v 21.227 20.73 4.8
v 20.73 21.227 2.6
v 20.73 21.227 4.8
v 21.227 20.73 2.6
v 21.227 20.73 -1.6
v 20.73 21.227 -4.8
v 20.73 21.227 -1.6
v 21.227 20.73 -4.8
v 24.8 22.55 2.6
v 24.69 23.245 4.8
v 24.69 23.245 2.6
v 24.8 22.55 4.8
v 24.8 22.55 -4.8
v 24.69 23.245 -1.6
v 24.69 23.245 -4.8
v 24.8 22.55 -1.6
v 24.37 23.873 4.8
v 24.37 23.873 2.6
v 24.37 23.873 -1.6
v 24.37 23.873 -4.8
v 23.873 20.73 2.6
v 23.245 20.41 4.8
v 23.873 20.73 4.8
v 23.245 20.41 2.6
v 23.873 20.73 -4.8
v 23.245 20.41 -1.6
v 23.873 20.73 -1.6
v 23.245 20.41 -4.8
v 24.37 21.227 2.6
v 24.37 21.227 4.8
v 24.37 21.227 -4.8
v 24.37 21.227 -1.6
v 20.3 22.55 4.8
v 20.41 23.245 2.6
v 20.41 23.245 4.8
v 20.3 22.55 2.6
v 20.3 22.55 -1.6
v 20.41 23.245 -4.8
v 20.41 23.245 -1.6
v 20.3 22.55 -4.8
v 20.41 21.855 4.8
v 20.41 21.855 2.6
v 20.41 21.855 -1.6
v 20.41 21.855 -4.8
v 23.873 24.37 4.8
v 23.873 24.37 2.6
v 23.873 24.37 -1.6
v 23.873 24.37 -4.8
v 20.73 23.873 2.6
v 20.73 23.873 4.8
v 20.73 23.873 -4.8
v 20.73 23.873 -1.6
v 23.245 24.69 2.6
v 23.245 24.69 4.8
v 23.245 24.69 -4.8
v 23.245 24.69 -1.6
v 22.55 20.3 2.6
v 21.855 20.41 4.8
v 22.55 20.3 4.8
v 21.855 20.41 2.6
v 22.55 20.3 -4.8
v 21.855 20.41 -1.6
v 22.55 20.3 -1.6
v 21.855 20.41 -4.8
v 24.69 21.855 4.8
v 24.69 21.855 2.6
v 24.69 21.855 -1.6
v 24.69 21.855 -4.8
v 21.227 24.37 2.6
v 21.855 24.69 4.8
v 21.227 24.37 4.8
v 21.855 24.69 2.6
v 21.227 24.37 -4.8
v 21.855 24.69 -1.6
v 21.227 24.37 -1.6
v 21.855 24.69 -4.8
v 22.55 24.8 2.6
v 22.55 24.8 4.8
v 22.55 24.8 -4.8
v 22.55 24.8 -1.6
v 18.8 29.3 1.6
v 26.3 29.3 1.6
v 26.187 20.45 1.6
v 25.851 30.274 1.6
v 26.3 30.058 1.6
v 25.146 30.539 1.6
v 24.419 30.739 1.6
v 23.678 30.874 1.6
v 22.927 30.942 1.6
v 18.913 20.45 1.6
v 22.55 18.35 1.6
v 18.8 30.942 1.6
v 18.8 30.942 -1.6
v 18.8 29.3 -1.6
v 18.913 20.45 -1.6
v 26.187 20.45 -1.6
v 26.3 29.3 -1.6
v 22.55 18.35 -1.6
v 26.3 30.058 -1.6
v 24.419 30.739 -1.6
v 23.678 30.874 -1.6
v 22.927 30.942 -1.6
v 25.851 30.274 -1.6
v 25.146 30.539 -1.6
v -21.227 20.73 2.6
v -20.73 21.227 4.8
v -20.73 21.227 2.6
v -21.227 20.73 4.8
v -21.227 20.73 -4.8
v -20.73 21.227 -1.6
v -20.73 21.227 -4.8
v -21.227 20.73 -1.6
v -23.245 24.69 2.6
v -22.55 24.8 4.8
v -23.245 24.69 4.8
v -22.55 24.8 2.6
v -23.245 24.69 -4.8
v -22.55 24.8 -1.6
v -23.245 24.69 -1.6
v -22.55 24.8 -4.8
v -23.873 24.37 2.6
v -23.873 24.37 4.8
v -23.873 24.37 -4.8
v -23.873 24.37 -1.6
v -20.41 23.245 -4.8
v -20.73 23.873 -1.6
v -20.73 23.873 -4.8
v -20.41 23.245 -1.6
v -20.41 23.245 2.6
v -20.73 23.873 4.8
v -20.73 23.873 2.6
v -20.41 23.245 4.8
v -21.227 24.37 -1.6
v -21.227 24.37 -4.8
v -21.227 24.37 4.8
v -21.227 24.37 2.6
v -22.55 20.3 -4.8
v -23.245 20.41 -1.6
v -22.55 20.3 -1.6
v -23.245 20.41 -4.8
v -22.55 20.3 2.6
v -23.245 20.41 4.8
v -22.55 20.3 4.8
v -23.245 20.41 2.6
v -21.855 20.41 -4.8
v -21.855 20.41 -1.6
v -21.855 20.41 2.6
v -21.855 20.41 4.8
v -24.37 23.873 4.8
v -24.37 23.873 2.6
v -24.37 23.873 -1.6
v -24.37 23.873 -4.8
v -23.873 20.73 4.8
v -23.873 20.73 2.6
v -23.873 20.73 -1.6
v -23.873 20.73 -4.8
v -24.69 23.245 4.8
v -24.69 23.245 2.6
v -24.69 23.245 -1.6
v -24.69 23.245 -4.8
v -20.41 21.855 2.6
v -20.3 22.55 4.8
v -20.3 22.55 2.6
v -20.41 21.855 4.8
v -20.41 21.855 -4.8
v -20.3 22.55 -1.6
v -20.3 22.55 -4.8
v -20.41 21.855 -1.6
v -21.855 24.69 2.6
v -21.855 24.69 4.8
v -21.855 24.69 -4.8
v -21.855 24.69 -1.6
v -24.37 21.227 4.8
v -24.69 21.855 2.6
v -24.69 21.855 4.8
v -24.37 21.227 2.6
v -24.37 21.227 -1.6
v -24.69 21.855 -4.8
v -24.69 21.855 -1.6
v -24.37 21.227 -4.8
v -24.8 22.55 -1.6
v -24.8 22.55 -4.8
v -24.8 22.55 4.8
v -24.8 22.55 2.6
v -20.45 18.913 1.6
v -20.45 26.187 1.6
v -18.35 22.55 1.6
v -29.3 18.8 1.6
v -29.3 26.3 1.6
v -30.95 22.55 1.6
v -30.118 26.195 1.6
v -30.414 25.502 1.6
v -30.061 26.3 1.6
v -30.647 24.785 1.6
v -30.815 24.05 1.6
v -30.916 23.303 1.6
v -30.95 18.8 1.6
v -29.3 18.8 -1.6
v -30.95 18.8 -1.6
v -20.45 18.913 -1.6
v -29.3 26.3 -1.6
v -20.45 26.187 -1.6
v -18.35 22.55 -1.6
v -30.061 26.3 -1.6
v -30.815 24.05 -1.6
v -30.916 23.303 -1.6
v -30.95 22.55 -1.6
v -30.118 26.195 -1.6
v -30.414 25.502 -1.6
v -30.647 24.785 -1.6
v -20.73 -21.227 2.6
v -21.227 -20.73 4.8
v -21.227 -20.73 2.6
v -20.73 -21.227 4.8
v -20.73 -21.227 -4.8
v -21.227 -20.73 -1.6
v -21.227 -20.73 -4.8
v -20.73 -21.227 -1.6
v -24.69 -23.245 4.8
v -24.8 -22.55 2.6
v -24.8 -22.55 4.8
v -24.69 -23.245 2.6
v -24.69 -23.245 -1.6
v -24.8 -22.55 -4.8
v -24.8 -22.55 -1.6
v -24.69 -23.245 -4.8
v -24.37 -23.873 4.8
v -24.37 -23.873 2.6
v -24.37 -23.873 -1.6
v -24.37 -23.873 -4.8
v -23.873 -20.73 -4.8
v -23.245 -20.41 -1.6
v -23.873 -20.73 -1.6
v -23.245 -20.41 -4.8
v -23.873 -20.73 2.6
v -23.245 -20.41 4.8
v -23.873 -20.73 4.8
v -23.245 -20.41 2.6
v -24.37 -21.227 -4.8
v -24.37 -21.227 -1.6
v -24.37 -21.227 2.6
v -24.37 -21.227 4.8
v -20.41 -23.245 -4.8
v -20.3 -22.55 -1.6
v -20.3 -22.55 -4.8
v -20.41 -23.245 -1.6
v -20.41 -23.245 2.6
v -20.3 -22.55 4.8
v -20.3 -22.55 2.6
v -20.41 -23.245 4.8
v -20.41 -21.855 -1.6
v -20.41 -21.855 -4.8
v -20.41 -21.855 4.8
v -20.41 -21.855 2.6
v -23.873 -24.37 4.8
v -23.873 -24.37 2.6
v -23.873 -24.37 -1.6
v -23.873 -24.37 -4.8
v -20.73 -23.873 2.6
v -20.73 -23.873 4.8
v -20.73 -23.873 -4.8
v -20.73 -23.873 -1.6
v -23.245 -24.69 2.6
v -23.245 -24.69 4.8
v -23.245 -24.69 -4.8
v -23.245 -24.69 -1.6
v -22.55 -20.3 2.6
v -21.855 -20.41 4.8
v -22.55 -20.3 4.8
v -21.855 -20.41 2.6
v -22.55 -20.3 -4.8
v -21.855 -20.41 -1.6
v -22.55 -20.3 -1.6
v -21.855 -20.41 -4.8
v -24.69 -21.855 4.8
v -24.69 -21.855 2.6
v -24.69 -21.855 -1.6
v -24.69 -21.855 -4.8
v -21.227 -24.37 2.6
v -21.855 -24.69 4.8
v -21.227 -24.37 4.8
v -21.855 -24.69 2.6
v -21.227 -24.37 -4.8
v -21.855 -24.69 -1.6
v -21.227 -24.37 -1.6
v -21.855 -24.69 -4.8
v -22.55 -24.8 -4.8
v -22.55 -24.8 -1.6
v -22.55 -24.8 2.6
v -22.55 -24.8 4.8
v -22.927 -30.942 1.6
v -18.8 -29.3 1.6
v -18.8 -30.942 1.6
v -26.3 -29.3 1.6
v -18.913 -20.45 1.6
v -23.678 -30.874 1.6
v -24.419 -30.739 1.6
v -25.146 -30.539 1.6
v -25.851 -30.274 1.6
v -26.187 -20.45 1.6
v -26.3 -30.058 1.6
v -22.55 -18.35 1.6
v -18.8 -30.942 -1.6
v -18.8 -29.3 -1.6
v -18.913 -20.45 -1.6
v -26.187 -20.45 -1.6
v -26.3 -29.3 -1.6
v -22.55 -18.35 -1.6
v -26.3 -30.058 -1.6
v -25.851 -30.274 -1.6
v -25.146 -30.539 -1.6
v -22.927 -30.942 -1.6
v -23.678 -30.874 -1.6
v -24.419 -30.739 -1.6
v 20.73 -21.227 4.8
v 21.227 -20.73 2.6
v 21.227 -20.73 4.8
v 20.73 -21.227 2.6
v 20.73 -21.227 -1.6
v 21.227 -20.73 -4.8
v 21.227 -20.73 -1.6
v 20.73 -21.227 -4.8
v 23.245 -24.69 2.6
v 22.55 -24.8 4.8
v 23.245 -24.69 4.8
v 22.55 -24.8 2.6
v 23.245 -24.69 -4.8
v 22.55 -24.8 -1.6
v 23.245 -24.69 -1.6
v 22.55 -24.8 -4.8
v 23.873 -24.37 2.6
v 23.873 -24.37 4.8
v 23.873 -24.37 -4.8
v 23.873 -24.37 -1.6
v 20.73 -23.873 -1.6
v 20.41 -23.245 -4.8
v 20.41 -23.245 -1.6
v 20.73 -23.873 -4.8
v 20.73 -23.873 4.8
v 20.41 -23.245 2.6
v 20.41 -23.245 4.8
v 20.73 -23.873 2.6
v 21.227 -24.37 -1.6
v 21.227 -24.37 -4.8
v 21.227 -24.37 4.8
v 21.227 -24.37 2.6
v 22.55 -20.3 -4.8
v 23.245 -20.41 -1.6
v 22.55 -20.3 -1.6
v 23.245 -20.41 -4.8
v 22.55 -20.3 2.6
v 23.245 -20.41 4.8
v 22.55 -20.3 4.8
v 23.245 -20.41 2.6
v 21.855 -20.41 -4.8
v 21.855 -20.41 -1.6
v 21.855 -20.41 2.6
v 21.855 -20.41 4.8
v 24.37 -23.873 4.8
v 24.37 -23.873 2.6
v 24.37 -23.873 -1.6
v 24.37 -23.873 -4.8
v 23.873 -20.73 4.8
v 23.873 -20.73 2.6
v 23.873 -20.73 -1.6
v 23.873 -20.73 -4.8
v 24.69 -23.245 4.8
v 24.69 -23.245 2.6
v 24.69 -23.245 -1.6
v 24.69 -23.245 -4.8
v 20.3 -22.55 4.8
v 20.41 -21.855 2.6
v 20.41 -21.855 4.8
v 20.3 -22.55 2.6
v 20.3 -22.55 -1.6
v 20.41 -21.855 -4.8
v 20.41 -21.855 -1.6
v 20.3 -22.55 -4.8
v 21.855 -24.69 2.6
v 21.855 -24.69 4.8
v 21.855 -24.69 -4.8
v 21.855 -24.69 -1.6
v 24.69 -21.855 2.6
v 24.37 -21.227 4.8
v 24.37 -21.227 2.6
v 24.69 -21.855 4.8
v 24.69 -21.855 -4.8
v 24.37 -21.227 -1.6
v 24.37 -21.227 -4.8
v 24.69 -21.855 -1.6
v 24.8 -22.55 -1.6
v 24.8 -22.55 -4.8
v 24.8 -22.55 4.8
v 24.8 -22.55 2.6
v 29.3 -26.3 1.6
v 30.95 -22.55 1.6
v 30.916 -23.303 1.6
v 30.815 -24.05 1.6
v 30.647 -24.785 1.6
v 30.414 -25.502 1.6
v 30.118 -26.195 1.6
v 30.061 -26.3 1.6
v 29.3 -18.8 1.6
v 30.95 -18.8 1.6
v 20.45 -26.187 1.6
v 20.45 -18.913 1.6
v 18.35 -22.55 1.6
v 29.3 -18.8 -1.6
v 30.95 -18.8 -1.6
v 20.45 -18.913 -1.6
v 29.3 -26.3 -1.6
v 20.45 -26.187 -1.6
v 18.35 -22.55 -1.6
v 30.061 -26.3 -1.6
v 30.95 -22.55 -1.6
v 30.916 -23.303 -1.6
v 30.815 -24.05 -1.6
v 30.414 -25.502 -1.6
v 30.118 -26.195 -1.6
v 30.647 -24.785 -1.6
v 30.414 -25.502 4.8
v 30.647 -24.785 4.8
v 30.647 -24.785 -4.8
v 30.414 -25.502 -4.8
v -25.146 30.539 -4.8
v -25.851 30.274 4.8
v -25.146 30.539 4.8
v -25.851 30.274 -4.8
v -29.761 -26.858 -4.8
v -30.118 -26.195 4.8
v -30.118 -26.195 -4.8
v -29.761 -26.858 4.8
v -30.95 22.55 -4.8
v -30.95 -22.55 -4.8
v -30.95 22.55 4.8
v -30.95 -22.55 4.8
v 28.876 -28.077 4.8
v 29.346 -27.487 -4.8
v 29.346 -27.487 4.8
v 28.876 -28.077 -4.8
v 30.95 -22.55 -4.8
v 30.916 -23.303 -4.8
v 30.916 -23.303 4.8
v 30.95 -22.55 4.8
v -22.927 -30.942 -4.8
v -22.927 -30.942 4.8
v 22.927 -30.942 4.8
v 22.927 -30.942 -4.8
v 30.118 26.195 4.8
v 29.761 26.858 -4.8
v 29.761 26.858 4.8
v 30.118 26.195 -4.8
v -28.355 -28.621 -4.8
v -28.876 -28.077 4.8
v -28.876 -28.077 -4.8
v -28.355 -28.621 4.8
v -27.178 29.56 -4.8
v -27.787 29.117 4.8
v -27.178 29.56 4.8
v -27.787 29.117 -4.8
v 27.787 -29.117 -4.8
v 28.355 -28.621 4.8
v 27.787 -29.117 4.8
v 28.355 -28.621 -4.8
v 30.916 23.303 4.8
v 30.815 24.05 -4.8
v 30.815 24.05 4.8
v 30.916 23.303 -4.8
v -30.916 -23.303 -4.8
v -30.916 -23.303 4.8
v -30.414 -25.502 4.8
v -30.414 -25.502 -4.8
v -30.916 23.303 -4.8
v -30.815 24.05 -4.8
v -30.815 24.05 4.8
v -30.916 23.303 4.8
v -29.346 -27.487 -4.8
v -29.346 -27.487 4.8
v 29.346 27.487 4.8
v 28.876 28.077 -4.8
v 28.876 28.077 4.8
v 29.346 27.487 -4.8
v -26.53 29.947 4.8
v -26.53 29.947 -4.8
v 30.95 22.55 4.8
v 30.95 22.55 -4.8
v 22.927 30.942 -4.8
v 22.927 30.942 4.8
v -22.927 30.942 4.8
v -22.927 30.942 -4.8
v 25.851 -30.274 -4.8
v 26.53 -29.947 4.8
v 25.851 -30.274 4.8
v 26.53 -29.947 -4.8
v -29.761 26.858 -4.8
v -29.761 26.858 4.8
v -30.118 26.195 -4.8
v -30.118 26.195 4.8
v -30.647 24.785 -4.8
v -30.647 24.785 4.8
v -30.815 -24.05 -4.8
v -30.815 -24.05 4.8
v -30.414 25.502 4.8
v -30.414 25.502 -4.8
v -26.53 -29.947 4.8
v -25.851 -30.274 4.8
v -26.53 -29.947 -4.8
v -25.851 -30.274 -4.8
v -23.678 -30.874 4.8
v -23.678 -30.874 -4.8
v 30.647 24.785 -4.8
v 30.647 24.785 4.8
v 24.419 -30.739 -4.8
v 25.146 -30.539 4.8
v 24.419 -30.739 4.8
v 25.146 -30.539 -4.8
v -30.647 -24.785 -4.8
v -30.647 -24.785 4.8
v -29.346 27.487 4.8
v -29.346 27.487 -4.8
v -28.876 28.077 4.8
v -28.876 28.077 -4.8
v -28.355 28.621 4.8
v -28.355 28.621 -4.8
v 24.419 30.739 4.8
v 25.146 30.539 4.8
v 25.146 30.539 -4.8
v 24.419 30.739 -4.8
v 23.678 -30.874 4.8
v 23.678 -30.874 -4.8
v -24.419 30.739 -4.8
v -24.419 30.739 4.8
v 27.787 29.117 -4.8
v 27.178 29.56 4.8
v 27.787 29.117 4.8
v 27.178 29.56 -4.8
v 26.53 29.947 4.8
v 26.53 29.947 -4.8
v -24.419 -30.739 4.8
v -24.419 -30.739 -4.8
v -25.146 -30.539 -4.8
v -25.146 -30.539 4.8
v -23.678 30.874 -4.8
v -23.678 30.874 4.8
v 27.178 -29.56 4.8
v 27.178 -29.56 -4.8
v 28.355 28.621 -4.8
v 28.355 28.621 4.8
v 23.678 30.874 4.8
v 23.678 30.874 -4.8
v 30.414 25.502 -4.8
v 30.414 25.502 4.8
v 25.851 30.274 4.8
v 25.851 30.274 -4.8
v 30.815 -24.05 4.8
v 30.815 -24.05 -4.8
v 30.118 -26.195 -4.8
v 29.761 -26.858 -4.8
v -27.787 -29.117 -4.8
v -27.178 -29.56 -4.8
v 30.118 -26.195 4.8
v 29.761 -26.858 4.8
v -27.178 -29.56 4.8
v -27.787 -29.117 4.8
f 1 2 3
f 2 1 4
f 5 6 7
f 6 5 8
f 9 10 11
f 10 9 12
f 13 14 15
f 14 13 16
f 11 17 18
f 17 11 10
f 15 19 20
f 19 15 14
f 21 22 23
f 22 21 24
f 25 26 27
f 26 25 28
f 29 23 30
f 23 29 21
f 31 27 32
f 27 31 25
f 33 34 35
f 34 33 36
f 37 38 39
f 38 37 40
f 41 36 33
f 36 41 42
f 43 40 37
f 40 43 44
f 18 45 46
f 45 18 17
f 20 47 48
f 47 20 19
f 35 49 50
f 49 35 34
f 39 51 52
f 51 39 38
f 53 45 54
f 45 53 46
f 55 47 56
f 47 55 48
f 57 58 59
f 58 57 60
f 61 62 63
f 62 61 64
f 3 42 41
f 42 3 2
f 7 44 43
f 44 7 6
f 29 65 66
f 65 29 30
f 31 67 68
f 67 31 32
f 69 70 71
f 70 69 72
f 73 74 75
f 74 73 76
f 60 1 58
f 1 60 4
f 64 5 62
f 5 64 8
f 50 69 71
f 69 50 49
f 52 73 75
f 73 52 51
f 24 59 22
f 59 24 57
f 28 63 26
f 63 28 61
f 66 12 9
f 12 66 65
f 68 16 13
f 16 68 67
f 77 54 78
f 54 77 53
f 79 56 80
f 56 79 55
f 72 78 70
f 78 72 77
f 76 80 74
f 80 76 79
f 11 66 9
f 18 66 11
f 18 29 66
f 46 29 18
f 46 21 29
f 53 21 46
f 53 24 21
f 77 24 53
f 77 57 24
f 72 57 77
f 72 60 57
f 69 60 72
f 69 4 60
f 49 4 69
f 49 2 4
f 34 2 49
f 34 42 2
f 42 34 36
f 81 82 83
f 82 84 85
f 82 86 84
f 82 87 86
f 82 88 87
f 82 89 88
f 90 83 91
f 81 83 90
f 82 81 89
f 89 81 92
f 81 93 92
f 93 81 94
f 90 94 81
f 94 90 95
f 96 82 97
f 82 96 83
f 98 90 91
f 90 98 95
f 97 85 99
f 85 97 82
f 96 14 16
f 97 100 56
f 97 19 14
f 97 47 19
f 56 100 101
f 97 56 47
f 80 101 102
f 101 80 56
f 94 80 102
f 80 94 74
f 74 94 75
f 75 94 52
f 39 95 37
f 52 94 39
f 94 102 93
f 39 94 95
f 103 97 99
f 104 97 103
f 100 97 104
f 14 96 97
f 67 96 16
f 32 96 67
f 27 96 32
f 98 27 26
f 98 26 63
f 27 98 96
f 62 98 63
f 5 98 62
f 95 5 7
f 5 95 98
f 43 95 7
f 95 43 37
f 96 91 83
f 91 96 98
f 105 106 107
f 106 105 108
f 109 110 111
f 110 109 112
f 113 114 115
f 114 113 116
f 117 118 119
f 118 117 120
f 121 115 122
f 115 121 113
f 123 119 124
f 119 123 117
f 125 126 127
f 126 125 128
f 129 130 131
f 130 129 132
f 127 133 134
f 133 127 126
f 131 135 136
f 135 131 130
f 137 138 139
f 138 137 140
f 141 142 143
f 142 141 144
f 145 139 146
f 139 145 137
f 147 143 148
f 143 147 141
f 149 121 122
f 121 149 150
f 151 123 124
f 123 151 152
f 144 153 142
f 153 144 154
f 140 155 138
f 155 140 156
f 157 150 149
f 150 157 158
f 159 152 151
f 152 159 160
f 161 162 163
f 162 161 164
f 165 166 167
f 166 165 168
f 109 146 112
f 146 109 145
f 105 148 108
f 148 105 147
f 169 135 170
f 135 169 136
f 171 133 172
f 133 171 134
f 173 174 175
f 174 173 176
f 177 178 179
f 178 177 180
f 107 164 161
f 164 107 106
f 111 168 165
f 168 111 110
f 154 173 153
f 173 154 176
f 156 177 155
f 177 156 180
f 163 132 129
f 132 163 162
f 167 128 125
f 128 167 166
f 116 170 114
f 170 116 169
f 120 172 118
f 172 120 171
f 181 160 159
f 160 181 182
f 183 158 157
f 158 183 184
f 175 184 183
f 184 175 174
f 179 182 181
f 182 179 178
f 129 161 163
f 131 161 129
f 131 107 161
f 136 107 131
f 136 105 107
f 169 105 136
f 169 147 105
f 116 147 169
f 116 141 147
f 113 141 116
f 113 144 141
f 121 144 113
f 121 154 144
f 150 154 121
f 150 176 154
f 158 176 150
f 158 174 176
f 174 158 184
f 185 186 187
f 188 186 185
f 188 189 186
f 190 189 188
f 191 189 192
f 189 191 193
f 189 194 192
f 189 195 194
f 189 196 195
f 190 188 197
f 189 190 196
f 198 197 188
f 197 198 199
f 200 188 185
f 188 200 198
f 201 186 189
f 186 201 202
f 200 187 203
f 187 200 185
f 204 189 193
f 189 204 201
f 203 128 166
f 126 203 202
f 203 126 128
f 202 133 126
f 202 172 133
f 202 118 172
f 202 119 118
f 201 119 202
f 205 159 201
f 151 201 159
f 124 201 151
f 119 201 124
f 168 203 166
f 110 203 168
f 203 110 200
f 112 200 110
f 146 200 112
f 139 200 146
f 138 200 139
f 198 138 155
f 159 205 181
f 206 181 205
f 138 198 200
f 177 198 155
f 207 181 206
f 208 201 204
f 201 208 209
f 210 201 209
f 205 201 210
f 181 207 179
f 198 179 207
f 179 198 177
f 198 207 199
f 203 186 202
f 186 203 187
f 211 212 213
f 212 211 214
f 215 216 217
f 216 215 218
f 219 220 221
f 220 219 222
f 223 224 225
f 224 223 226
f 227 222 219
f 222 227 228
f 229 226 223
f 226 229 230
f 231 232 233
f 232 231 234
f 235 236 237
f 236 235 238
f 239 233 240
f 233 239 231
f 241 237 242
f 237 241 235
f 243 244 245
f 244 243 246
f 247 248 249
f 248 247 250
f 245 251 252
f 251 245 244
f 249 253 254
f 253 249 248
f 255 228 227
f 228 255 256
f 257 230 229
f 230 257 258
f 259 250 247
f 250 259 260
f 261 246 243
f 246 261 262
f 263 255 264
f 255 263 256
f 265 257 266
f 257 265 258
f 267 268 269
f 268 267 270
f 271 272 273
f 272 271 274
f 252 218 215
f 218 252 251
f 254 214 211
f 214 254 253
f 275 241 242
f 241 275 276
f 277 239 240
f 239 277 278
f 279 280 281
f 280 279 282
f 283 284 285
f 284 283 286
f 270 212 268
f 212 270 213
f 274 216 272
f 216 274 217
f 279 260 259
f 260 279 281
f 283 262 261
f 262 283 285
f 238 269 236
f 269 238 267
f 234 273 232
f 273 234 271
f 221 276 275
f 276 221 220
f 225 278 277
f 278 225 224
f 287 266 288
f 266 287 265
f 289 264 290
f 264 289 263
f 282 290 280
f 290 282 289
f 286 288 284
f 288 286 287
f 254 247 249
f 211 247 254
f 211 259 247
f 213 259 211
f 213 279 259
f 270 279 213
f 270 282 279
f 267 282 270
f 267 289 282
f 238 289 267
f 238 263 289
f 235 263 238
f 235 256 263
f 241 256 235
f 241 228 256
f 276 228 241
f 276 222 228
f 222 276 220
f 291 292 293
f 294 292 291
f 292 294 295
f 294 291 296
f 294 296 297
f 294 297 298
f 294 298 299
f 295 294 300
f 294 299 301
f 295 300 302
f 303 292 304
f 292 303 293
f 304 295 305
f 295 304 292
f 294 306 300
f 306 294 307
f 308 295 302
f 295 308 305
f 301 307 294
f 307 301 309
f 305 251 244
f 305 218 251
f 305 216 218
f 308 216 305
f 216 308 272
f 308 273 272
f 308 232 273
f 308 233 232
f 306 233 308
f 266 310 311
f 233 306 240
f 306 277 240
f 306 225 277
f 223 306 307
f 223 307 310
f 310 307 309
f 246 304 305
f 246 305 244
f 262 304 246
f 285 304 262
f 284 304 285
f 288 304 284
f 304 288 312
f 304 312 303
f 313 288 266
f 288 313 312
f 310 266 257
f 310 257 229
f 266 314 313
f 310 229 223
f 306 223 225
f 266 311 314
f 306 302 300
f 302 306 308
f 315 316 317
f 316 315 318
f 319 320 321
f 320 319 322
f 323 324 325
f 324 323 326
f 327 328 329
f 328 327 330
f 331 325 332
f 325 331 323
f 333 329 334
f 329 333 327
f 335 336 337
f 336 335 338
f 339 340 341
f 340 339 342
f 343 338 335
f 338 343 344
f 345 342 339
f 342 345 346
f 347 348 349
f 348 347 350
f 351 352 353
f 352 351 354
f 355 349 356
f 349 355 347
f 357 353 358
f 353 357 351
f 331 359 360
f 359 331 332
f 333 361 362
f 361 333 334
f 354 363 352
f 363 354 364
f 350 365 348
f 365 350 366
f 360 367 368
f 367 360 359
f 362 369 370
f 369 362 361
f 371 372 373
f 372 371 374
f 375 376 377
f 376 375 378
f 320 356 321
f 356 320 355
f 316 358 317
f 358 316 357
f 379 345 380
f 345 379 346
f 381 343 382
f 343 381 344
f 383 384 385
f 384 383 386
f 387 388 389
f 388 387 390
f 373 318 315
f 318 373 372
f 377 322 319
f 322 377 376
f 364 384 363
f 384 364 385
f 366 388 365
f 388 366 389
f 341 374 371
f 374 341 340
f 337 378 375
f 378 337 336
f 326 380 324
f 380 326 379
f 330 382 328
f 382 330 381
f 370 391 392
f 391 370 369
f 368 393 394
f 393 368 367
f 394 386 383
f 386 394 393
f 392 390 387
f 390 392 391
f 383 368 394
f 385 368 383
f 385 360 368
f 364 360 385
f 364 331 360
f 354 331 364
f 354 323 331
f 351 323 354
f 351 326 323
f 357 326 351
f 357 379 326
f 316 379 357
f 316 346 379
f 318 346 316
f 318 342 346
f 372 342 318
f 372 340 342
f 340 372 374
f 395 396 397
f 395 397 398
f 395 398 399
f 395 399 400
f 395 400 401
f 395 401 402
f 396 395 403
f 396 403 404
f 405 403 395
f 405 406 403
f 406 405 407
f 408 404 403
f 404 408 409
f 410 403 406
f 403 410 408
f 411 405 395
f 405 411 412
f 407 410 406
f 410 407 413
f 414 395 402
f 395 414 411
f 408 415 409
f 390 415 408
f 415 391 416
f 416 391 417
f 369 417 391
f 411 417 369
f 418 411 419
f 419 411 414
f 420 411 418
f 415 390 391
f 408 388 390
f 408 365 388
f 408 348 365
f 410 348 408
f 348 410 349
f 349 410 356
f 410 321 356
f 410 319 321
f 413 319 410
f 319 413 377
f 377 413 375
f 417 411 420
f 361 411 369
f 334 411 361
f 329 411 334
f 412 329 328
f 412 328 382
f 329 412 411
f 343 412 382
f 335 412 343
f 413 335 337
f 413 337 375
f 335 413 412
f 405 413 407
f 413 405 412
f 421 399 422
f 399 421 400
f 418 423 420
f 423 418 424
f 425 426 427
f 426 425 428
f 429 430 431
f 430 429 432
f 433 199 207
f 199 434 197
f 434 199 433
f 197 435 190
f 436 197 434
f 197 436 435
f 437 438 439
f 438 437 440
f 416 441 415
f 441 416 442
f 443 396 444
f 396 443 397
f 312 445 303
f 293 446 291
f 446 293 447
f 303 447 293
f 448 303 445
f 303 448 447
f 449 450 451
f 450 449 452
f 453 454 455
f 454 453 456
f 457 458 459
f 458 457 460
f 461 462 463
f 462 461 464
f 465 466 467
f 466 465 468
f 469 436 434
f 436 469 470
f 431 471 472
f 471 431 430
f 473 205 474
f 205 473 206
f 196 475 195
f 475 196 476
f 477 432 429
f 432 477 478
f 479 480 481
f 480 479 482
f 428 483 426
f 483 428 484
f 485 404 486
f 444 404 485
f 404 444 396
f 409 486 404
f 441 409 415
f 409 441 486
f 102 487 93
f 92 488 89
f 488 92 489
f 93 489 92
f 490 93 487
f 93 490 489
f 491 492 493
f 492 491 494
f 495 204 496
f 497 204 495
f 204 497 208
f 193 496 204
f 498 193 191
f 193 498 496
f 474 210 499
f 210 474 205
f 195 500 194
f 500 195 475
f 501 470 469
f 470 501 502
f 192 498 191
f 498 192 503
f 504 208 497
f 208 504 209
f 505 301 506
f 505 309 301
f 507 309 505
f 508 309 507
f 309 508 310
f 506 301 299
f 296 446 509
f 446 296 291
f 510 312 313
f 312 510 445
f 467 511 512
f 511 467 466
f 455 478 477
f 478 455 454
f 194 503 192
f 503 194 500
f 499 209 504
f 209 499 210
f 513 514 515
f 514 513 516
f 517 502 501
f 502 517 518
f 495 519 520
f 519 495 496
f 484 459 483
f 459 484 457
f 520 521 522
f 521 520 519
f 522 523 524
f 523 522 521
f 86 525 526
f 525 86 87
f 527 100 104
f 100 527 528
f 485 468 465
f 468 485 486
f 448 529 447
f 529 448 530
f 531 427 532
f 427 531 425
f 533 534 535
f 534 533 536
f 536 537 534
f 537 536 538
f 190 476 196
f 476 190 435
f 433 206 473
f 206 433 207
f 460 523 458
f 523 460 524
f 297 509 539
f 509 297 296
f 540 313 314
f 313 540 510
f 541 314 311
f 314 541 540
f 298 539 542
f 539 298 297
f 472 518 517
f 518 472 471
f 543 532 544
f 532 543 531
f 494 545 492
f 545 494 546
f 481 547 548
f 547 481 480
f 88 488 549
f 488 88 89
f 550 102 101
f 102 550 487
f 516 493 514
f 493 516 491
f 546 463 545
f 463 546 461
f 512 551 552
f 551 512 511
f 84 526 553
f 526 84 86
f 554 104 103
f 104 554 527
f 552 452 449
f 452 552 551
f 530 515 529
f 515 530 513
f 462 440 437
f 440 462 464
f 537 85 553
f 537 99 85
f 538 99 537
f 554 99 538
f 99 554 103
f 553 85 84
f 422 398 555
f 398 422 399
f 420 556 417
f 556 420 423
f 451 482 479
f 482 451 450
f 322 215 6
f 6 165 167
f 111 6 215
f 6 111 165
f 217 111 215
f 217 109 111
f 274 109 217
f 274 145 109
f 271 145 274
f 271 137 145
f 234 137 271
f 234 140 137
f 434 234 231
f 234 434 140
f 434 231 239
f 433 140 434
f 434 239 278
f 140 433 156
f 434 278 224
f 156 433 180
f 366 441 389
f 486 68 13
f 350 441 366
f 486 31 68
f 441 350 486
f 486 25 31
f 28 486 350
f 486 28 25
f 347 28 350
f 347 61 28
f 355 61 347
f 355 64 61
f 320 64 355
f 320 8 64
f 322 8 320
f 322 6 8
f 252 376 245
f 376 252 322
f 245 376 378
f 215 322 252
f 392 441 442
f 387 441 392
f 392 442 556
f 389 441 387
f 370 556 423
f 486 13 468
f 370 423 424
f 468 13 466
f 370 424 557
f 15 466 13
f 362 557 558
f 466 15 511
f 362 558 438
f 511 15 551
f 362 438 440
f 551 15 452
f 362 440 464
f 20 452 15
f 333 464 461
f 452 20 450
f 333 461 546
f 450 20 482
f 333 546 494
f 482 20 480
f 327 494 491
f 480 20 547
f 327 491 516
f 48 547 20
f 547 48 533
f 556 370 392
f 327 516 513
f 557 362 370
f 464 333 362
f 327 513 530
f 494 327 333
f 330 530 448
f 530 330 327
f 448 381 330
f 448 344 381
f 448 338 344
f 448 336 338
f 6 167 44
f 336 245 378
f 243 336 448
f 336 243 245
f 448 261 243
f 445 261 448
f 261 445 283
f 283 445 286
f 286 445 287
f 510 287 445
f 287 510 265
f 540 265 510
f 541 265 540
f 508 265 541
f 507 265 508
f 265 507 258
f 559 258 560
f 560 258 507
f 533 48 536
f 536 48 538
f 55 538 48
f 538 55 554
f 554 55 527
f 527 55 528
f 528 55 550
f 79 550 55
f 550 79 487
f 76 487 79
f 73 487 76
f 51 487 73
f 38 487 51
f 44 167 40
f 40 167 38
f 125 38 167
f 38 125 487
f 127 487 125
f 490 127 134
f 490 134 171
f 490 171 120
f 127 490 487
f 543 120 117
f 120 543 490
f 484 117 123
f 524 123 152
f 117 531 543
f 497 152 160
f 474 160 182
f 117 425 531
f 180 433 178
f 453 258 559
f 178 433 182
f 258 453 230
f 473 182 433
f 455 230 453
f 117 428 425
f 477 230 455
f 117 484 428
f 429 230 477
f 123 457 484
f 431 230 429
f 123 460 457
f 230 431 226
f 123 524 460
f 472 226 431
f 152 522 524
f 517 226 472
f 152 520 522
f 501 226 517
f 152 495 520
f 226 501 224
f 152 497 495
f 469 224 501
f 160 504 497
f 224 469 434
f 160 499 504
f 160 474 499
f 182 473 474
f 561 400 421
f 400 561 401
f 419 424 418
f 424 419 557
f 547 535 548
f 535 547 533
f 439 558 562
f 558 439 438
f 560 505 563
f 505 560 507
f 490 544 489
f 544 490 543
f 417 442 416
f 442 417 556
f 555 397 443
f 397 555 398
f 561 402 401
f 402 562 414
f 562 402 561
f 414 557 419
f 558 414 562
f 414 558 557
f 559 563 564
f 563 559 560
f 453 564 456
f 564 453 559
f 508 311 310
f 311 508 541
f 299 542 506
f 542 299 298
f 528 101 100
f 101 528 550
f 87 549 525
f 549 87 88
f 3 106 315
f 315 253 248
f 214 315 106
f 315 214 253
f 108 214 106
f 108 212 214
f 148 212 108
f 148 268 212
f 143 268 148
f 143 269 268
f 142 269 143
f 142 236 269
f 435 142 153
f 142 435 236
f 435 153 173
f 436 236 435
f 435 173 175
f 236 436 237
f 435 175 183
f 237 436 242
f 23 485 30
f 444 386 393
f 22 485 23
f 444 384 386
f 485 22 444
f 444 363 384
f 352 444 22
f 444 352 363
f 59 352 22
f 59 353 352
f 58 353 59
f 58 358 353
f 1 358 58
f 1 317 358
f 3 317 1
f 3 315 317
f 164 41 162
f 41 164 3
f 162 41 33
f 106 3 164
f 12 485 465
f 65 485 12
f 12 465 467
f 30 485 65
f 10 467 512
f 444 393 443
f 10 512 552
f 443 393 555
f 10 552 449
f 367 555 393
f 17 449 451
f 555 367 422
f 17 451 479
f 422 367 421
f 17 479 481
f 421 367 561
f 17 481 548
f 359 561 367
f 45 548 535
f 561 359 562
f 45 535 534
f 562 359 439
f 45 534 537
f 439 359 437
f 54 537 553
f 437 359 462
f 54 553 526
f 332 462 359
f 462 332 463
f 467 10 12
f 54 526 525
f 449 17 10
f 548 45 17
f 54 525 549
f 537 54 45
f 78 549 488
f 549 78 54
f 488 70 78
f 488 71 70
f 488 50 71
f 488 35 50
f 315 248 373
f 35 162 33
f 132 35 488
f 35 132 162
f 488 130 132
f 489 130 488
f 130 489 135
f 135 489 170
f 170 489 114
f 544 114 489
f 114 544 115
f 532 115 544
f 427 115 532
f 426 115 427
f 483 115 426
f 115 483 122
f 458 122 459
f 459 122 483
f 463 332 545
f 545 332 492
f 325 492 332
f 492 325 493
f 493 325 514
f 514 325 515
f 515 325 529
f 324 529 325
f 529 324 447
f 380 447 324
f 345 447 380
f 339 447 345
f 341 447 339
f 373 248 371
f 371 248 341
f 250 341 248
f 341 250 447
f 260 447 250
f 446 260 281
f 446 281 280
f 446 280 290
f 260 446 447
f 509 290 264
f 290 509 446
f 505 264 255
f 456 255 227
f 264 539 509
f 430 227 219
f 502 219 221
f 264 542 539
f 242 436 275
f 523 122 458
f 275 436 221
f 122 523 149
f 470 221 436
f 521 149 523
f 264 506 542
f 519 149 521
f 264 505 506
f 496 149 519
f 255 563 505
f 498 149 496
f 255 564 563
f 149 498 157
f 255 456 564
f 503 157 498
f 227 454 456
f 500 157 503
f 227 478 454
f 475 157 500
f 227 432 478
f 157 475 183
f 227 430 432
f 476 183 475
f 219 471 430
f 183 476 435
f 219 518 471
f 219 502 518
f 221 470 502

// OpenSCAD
// file: ../../parameters.scad
//Main tube diameter - hole [mm]
main_tube_outer_diameter = 25.4;
main_tube_inner_diameter = 23.05;

//Tube for undercarriage - rendered hole [mm]
tube_for_undercarriage_outer_diameter = 10.6;
tube_for_undercarriage_inner_diameter = 6;
layer_thickness = 0.3;
global_clearance = 0.5;


// Nastavení parametrů rotoru

gliding_aggle = 14;         // tenhle úhel by se zřejmě v budoucnu měl počítat z požadované klouzavosti.


rotor_blade_AOA = 1.5;      // nastavení úhlu náběhu rotorového listu
rotor_blade_length = 970;   // délka rotorového listu
rotor_blade_depth = 50;     // hloubka rotorového listu

// nastavení parametrů motoru

engine_angle = -8;
engine_diameter = 55;
engine_offset = 55;

engine_screws_radius = 15;
engine_holes_radius = (24 + 44)/4;
engine_shatf_hole_diameter = 13;

// Parameters of tube couplings
coupling_wall_thickness = main_tube_outer_diameter/5;  //width of coupling walls
thickness_between_tubes = main_tube_outer_diameter/10;    // minimum distance between tubes in couplings

coupling_wall_thickness_undercarriage = tube_for_undercarriage_outer_diameter/3;
thickness_between_tubes_undercarriage = tube_for_undercarriage_outer_diameter/10;

608_bearing_outer_diameter = 22.3;
608_bearing_inner_diameter = 16;
608_bearing_thickness = 7.1;


// screw length step - minimum difference in length between two types of screws
basic_screw_length = 5;


//Screw diameter and nut for M10 [mm]
M10_screw_diameter=10.4;
M10_head_height = 10;
M10_head_diameter = 16+0.5;
M10_nut_height = 10.5;
M10_nut_diameter = 25.5;
M10_nut_pocket = 22.3;

//Screw diameter for M8 [mm]
M8_screw_diameter = 8.6;
M8_head_height = 8;
M8_head_diameter = 13.5;
M8_nut_height = 7.5;
M8_nut_diameter = 14.4 + 0.5;
M8_nut_pocket = 13 + 0.5;

//Screw diameter and nut for M6 [mm]
M6_screw_diameter=6.5;
M6_head_diameter = 10+0.5;
M6_head_height = 6;
M6_nut_height = 4.9;
M6_nut_diameter = 11.8;
M6_nut_pocket = 10.4;
M6_square_nut_height = 3;
M6_square_nut_diameter = 10;

//Screw diameter and nut for M5 [mm]
M5_screw_diameter=5.5;
M5_head_height = 5;
M5_head_diameter = 13+0.5;
M5_nut_height = 4.5;
M5_nut_diameter = 9.4;
M5_nut_pocket = 8.4;

//Screw diameter and nut for M4 [mm]
M4_screw_diameter=4.5;
M4_screw_head_height = 4;
M4_nut_height = 3.2;
M4_nut_diameter = 8.4;
M4_nut_pocket = 7.5;

//Screw diameter and nut for M3 [mm]
M3_screw_diameter = 3.2;
M3_nut_height = 2.7;
M3_nut_diameter = 6.6;
M3_screw_head_height = 3;

//Screw diameter and nut for M2,5 [mm]
M2_5_screw_diameter = 2.7;
M2_5_nut_height = 2.3;
M2_5_nut_diameter = 6;
M2_5_nut_pocket = 5.5;


//šroub servo
Servo_screw = 1.5;

//The tube for help
Help_main_tube_outer = 25;
Help_main_tube_inner = 23;
Help_tube_for_undercarriage_outer = 10;
Help_tube_for_undercarriage_inner = 5;


//main hull parameters

hull_drop_length = 580;
hull_wall_thickness = 0.8;
hull_y_size = 120;
hull_z_size = 150;
hull_x_size = 580;
hull_corner_radius = 4;
hull_airfoil_thickness= 35;  // thickness of drop generating airfoil in percent of length.
hull_scale_x = 1;
hull_scale_y = 1.5;
hull_scale_z = 1.5;

main_pilon_position = 170+68+30;       // pozice rotorového pilonu měřená od přední části krytu
cover_pilon_position = 180;
height_of_vertical_tube = 275; //278mm je změřená délka trubky.

//délka hlavní dlouhé trubky
length_of_main_tube = 820;
length_of_undercarriage_tube = 300;

ribbon_width = 5; // šířka vyztužovacích lemů.

// šířka otvoru v přední části kapoty pro držák motoru.
width_of_engine_holder = 63;

//Top Cover Division - dělení horního krytu pro tisk
top_cover_division = [0, 50, 150, 280, 410, hull_x_size]; // upraveny seznam tak, aby deleni začinalo od nuly, což umožňí úplně automatické rozdělení.

//Bottom Cover Division - dělení dolního krytu pro tisk
bottom_cover_division = [0,100,232.5,365, 470, hull_x_size];
// zkrácená část pro payload pro testovací tisk
//bottom_cover_division = [0,200,250,365, 470, hull_x_size];




rotor_height = height_of_vertical_tube + main_tube_outer_diameter/2 + 2*global_clearance + thickness_between_tubes + 30; // změřená výška rotoru je 367mm
center_of_gravity_position = [main_pilon_position - tan(gliding_aggle)*rotor_height, 0, 0];



//Cover pilon division - na výšku (v ose Z)
cover_pilon_division = [0,170,height_of_vertical_tube + main_tube_outer_diameter + coupling_wall_thickness];

//pozice šroubů
	//horní kryt
top_screw_position = [0,
                    (top_cover_division[0] + top_cover_division[1])/2,
                    (top_cover_division[2] - top_cover_division[1])/2 + top_cover_division[1],
                    (top_cover_division[3] - top_cover_division[2])/2 + top_cover_division[2],
                    (top_cover_division[4] - top_cover_division[3])/8 + top_cover_division[3],
                    (top_cover_division[5] - top_cover_division[4])/2 + top_cover_division[4] - top_cover_division[1]/3];
	//spodní kryt
bottom_screw_position = [0,
                        (bottom_cover_division[0] + bottom_cover_division[1])*(2/6),
                        bottom_cover_division[1]*(9/10),
                        bottom_cover_division[3] + bottom_cover_division[1]*(1/10),
                        bottom_cover_division[3] + bottom_cover_division[1]*(3/5)];




//šířka zámků
lock_width = 10;

//délka zámků
lock_length = 3;


//accumulator
//základní rozměry akumulátoru
width_of_accumulator = 129.4;//45+1;
depth_of_accumulator = 40.61;
height_of_accumulator = 43.65;
//Zapuštění akumulátoru
sink_of_accumulator = 5; //main_tube_outer_diameter/5 - M3_nut_height*1.5;

//tloušťka hrany spojky
accumulator_holder_width = 18;
accumulator_holder_thickness = 10;

//posunutí akumálátoru na podložce
move_of_accumulator = 75;   // pozice akumulátoru (ovlivňuje těžiště)


////////////////
// Senzory
///////////////////

//opticalFlow
width_optical_flow_senzor = 45.5;
depth_optical_flow_senzor = 6;
height_optical_flow_senzor = 35;
sink_of_optical_flow_senzor = depth_optical_flow_senzor - 5;
M3_optical_flow_senzor_Z = 30.4;
M3_optical_flow_senzor_X = 24;
M3_optical_flow_senzor_Z_alone = 9.1;
M3_optical_flow_senzor_X_alone = 16.7;

//GPS anténa
GPS_outer_length = 48.01;   //Vnější rozměr
GPS_inner_length = 37.48;   //Vnitřní rozměr
GPS_diameter = (GPS_outer_length - GPS_inner_length)/2;    //Průměr otvoru
GPS_middle_length = GPS_diameter + GPS_inner_length;      //Střední rozměr


////podzvozek

radius_undercarriage = 25;
vzdalenost_x = tan(20) * 131;
vzdalenost_y = (131 - radius_undercarriage)/tan(79);
uhel_y = 90 - 20;
uhel_x = 90 - 79;

maximum_printable_size = 150;


////Pitotova trubice
Pitot_tube_diameter = 4.02 + 1;
Distance_hole_from_tube = 11.92;  //vzdálenost otvoru pro připevnění od samotné trubičky


////směrové kormidlo
Rudder_length = 4*main_tube_outer_diameter;
Rudder_height = 2*main_tube_outer_diameter;
Rudder_depth = main_tube_outer_diameter/2;
gap_width = 2*hull_wall_thickness;      //šířka mezery mezi směrovkou a ocasní plochou
ruder_shaft_diameter = 2.6; //otočné uchycení směrovky - průměr 2 mm


/////spojka 666_1004

    width_666_1004 = (main_tube_outer_diameter+2*coupling_wall_thickness - M3_screw_head_height)/basic_screw_length;
//        echo("width_666_1004 is", width_666_1004);

//        echo("ceil_666_1004 is", ceil(width_666_1004));

    coupling_screw_length_666_1004 = (ceil(width_666_1004)) * basic_screw_length;
        echo("coupling_screw_length_666_1004 is", coupling_screw_length_666_1004);

    coupling_width_666_1004 = coupling_screw_length_666_1004 + M3_screw_head_height;
//        echo("coupling_width_666_1004 is", coupling_width_666_1004);

    height_666_1004 = coupling_width_666_1004;
//        echo("height_666_1004 is", height_666_1004);

    depth_666_1004 = main_tube_outer_diameter*2+2*coupling_wall_thickness+thickness_between_tubes;
//        echo("depth_666_1004 is", depth_666_1004);

    depth_666_1004_drillhelper = main_tube_outer_diameter*3;

/////spojka 666_1026



    width_666_1026 = main_tube_outer_diameter + 2*thickness_between_tubes;

    depth_666_1026 = (main_tube_outer_diameter*2)/basic_screw_length;
//        echo("depth_666_1026 is", depth_666_1026);

//        echo("ceil_666_1026 is", ceil(depth_666_1026));

    coupling_screw_length_666_1026 = (ceil(depth_666_1026)) * basic_screw_length;
        echo("coupling_screw_length_666_1026 is", coupling_screw_length_666_1026);


    thickness_of_plate = coupling_screw_length_666_1026 - M4_screw_head_height - 50; //50 mm je konstatní šířka spojky 666_1026
    echo("thickness_of_plate is", thickness_of_plate);

    coupling_depth_666_1026 = coupling_screw_length_666_1026 - M4_screw_head_height - thickness_of_plate;      //zde je odečten M4_screw_head_height pro určení šířky, tak aby šroub přesahoval pro potřebnou matku
//        echo("coupling_depth_666_1026 is", coupling_depth_666_1026);

    height_666_1026 = 2*main_tube_outer_diameter;
//        echo("height_666_1026 is", height_666_1026);

//tloušťka plechu pro zajištění konstatní šířky spojky 50 mm

    width_666_1026_drillhelper = main_tube_outer_diameter*2;

    depth_666_1026_drillhelper = main_tube_outer_diameter + 4*thickness_between_tubes;


////spojka 666_1017

    width_666_1017 = (main_tube_outer_diameter + 4*coupling_wall_thickness - M3_screw_head_height)/basic_screw_length;
//        echo("width_666_1017 is", width_666_1017);

//        echo("ceil_666_1017 is", ceil(width_666_1017));

    coupling_screw_length_666_1017 = (ceil(width_666_1017)) * basic_screw_length;
        echo("coupling_screw_length_666_1017 is", coupling_screw_length_666_1017);

    coupling_width_666_1017 = coupling_screw_length_666_1017 + M3_screw_head_height;
//        echo("coupling_width_666_1017 is", coupling_width_666_1017);

    depth_666_1017 = coupling_width_666_1017;

    height_666_1017= 70; //main_tube_outer_diameter*1.8+main_tube_outer_diameter+wall_thickness;

    width_666_1017_drillhelper = main_tube_outer_diameter+4*thickness_between_tubes;

    depth_666_1017_drillhelper = main_tube_outer_diameter*2;


////spojka 666_1014

    width_666_1014 = tube_for_undercarriage_outer_diameter + 2*coupling_wall_thickness_undercarriage;

    depth_666_1014 = tube_for_undercarriage_outer_diameter + M3_screw_diameter + 2*coupling_wall_thickness_undercarriage + thickness_between_tubes_undercarriage;

    height_666_1014 = width_666_1014;


    width_666_1014_drillhelper = 2*tube_for_undercarriage_outer_diameter + 2*coupling_wall_thickness_undercarriage;



////spojka 666_1015

    width_666_1015 = tube_for_undercarriage_outer_diameter + 2*coupling_wall_thickness_undercarriage;

    depth_666_1015 = tube_for_undercarriage_outer_diameter*2 + 2*coupling_wall_thickness_undercarriage + thickness_between_tubes_undercarriage;

    height_666_1015 = width_666_1015;


    width_666_1015_drillhelper = 2*tube_for_undercarriage_outer_diameter + 2*coupling_wall_thickness_undercarriage;

////spojka 666_1016

    width_666_1016 = tube_for_undercarriage_outer_diameter + 2*coupling_wall_thickness_undercarriage;

    depth_666_1016 = tube_for_undercarriage_outer_diameter + M6_screw_diameter + 2*coupling_wall_thickness_undercarriage + thickness_between_tubes_undercarriage;

    height_666_1016 = width_666_1016;


    width_666_1016_drillhelper = 2*tube_for_undercarriage_outer_diameter + 2*coupling_wall_thickness_undercarriage;




//umístění podvozkových trubek

second_undercarriage_hole =height_666_1026 + height_666_1004/2 + 170 + 160;


//Base Divison - dělení podložky
base_division = [0, 159, main_pilon_position + coupling_width_666_1017/2 + global_clearance/2, second_undercarriage_hole + coupling_width_666_1004/2 + global_clearance/2, hull_x_size];

// šrouby pro připevnění podložky k hlavní trubce
base_mounting_screw_length = 50;


// kulove lozisko

bearing_efsm_08_h = 33+1;
bearing_efsm_08_m = 22;
bearing_efsm_08_db = 18;
bearing_efsm_08_ag = 10.5;
bearing_efsm_08_n = M4_screw_diameter;
bearing_efsm_08_a1 = 5.5;
bearing_efsm_08_d = 8.25;
bearing_efsm_08_B = 8; // ball height

bearing_efsm_10_h = 38+1;
bearing_efsm_10_m = 26;
bearing_efsm_10_db = 21.9;
bearing_efsm_10_ag = 12+0.2;
bearing_efsm_10_n = M5_screw_diameter;
bearing_efsm_10_a1 = 6.5;
bearing_efsm_10_d = 10.25;


bearing_efsm_12_width = 40+1;
bearing_efsm_12_h = bearing_efsm_12_width;
bearing_efsm_12_boltd = 28/2; // polovina vzdalenosti mezi srouby
bearing_efsm_12_m = bearing_efsm_12_boltd*2;
bearing_efsm_12_db = 25;
bearing_efsm_12_ag = 13;
bearing_efsm_12_a1 = 7;
bearing_efsm_12_n = M5_screw_diameter;
bearing_efsm_12_d = 12.15;
bearing_efsm_12_B = 10; // ball height
bearing_efsm_space = 1;

bearing_efsm_17_width = 54+1;
bearing_efsm_17_h = bearing_efsm_17_width;
bearing_efsm_17_boltd = 38/2; // polovina vzdalenosti mezi srouby
bearing_efsm_17_m = bearing_efsm_17_boltd*2;
bearing_efsm_17_db = 35;
bearing_efsm_17_ag = 18;
bearing_efsm_17_n = M6_screw_diameter;
bearing_efsm_17_a1 = 10;
bearing_efsm_17_B = 17; // ball height

//limcove lozisko
bearing_EFOM_10_L=26; //celkova sirka zakladny
bearing_EFOM_10_d1=10.3;//diametr otvoru real=10 mm
bearing_EFOM_10_dB=22;//diametr vystupku pro ulozeni lozika
bearing_EFOM_10_H=52;//celková delka zakladny
bearing_EFOM_10_J=36;// hole pitch
bearing_EFOM_10_A1=6.5;//vyska pouzdra
bearing_EFOM_10_Ag=12;//celkova vyska
bearing_EFOM_10_N1=5;//sirka otvoru pro sroub
bearing_EFOM_10_N2=8;//delka otvoru pro sroub
bearing_EFOM_10_m=36;//roztec der pro sroub
bearing_EFOM_10_h=9;//vyska lozika




// 20 KG servo parameters


servo_20kg_axis_offset = 9.375; // jak je osa mimo stredu
servo_20kg_body_x = 42;
servo_20kg_body_y = 21;
servo_20kg_body_z = 40;
servo_20kg_thread_x = 49/2;
servo_20kg_thread_y = 10/2;
servo_20kg_body_below = 10; // jak hluboko je tělo serva pod drzaky na srouby
servo_20kg_below = 25.8; // jak hluboko je páka serva pod drzaky na srouby

servo_20kg_bolt_d = 2.5+0.3;
servo_20kg_nut_d = 5+0.3;



//  888_2***
//    G2
//


g2_0_part_space = 2; // mezera mezi zadni a predni casti

g2_5_height = 608_bearing_outer_diameter*1.5;
g2_5_width = 70+5.5+11;
g2_5_threads = 2; // kolik ma byt sroubu skrz nosnou tyc

g2_5_m3_length = base_mounting_screw_length; // sroub, ktery se pouziva na sesroubovani s nosnou tyci
g2_5_servo_shift = 30;
g2_5_servo_wall = 5;

g2_5_m8_length = 60; // sroub, ktery se pouziva jako osa pro podlozku
g2_5_front_l = main_tube_outer_diameter + 608_bearing_outer_diameter*2;// jak moc ma byt magnet v predu

g2_5_zapusteni_serva = 30;
g2_5_length = g2_5_zapusteni_serva + 2*main_tube_outer_diameter + 30;
g2_5_length_offset = -10;

g2_5_bearing_space = 2; // mezera pro podlozku mezi loziskem a stenou..


g2_0_vertical_bolts = 2;
g2_0_space_btw_wheel_holder = 25.8;

g2_6_plate_thickness = 8;
g2_6_servo_distance = 54; // jak je daleko servo pred tyci kola
g2_6_servo_shift = 0; // jak je osa serva mimo stredu
g2_6_servo_bolt_l = 8; // delka sroubu od konce serva po zacatek matky
g2_6_min_wall_around = 8; // minimalni material okolo serva




// pro dily ze skupiny 3 (888_30**)
g3_0_cone1 = 70;
g3_0_cone2 = 50;
g3_0_cone_height = 25;
g3_0_cone_top_height = 11;
g3_0_height = g3_0_cone_height + 40;
g3_0_bearing_bolt_len = 50;
g3_0_srcew_dist = 55;


// Nastavní volností skupiny dílů 888_30**
// Nastavení rozsahů je v deg
g3_0_pitch_limit = [-20:3:20];
g3_0_roll_limit = [-15:3:15];
g3_0_yaw_limit = [-10:3:10];


//pro zakladnu na strechu auta
g3_1_yaw_width = 75;
g3_1_service_holl_height = 8.4 + 2;
g3_1_service_holl_width = 16 + 1.5;

//pro druhy dil
g3_7_length = maximum_printable_size;
g3_7_width = bearing_efsm_17_width + 2*1+ 2*3;
g3_7_height = M8_screw_diameter*3;

g3_8_magnet_wall_thickness = 7;  // tloustka steny u magnetu
g3_8_bearing_wall_thickness = bearing_efsm_12_ag-bearing_efsm_12_a1;
g3_8_magnet_diameter = 63;
g3_8_cylinder_d = 55; // prumer valce
g3_8_cylinder_h = 30 + g3_8_magnet_wall_thickness;
g3_8_m5_lenght = 40; // delka sroubu pro pridelani kuloveho loziska
g3_8_pocket_wall = g3_8_cylinder_h-(g3_8_m5_lenght-bearing_efsm_12_a1-M5_nut_height-5);

// podlozka na strechu auta
g3_9_height = 145;



servo_20kg_width = 21;   //šřka otvoru pro servo
servo_20kg_height = 42;  //výška otvoru pro servo

//strain gauge
strain_gauge_width = 12.7;
strain_gauge_length = 75.1;
strain_gauge_screw_distance = 10;

//ALU profile
ALU_profile_width = 30.1;
ALU_profile_holder_wall_thickness = 3;
ALU_profile_groove_width = 8;

//pillow block bearing
//https://www.igus.eu/product/372
//Part no. KSTM-08
KSTM08_screws_distance = 33;         //m
KSTM08_screws_holes_diameter = 4.5;  //d2
KSTM08_flange_thickness = 6;         //h3
KSTM08_case_width = 9;               //C1
KSTM08_case_length = 47;             //a
KSTM08_ball_width = 12;              //B
// main file
include <../../parameters.scad>

module rotor_joint() {
    module screw_nut_hole() {
        difference() {
            translate([(ALU_profile_width/2+ALU_profile_holder_wall_thickness+M4_screw_diameter), (ALU_profile_width/2+ALU_profile_holder_wall_thickness+M4_screw_diameter), 0])
                cylinder(d=M4_screw_diameter, h=M4_nut_height*3+0.1, center=true, $fn=20);
            translate([(ALU_profile_width/2+ALU_profile_holder_wall_thickness+M4_screw_diameter), (ALU_profile_width/2+ALU_profile_holder_wall_thickness+M4_screw_diameter), M4_nut_height/2])
                cylinder(d=M4_screw_diameter, h=1, $fn=20); 
        }

        hull() {
            translate([(ALU_profile_width/2+ALU_profile_holder_wall_thickness+M4_screw_diameter), (ALU_profile_width/2+ALU_profile_holder_wall_thickness+M4_screw_diameter), 0])
                rotate([0, 0, 30])
                    cylinder(d=M4_nut_diameter, h=M4_nut_height, $fn=6, center=true);

            translate([(ALU_profile_width/2+ALU_profile_holder_wall_thickness+M4_screw_diameter), (ALU_profile_width/2+ALU_profile_holder_wall_thickness+M4_screw_diameter)+M4_screw_diameter*2, 0])
                cube([M4_nut_pocket, M4_screw_diameter, M4_nut_height], center=true);
        }
    }

    difference() {
        minkowski() {
            cube([ALU_profile_width+ALU_profile_holder_wall_thickness*2+M4_screw_diameter*2, ALU_profile_width+ALU_profile_holder_wall_thickness*2+M4_screw_diameter*2, M4_nut_height*3/2], center=true);
            cylinder(d=M4_nut_diameter*2, h=M4_nut_height*3/2, $fn=70, center=true);
        }
        screw_nut_hole();
        rotate([0, 0, 90])
            screw_nut_hole();
        rotate([0, 0, 180])
            screw_nut_hole();
        rotate([0, 0, 270])
            screw_nut_hole();
    }
}

rotor_joint();
